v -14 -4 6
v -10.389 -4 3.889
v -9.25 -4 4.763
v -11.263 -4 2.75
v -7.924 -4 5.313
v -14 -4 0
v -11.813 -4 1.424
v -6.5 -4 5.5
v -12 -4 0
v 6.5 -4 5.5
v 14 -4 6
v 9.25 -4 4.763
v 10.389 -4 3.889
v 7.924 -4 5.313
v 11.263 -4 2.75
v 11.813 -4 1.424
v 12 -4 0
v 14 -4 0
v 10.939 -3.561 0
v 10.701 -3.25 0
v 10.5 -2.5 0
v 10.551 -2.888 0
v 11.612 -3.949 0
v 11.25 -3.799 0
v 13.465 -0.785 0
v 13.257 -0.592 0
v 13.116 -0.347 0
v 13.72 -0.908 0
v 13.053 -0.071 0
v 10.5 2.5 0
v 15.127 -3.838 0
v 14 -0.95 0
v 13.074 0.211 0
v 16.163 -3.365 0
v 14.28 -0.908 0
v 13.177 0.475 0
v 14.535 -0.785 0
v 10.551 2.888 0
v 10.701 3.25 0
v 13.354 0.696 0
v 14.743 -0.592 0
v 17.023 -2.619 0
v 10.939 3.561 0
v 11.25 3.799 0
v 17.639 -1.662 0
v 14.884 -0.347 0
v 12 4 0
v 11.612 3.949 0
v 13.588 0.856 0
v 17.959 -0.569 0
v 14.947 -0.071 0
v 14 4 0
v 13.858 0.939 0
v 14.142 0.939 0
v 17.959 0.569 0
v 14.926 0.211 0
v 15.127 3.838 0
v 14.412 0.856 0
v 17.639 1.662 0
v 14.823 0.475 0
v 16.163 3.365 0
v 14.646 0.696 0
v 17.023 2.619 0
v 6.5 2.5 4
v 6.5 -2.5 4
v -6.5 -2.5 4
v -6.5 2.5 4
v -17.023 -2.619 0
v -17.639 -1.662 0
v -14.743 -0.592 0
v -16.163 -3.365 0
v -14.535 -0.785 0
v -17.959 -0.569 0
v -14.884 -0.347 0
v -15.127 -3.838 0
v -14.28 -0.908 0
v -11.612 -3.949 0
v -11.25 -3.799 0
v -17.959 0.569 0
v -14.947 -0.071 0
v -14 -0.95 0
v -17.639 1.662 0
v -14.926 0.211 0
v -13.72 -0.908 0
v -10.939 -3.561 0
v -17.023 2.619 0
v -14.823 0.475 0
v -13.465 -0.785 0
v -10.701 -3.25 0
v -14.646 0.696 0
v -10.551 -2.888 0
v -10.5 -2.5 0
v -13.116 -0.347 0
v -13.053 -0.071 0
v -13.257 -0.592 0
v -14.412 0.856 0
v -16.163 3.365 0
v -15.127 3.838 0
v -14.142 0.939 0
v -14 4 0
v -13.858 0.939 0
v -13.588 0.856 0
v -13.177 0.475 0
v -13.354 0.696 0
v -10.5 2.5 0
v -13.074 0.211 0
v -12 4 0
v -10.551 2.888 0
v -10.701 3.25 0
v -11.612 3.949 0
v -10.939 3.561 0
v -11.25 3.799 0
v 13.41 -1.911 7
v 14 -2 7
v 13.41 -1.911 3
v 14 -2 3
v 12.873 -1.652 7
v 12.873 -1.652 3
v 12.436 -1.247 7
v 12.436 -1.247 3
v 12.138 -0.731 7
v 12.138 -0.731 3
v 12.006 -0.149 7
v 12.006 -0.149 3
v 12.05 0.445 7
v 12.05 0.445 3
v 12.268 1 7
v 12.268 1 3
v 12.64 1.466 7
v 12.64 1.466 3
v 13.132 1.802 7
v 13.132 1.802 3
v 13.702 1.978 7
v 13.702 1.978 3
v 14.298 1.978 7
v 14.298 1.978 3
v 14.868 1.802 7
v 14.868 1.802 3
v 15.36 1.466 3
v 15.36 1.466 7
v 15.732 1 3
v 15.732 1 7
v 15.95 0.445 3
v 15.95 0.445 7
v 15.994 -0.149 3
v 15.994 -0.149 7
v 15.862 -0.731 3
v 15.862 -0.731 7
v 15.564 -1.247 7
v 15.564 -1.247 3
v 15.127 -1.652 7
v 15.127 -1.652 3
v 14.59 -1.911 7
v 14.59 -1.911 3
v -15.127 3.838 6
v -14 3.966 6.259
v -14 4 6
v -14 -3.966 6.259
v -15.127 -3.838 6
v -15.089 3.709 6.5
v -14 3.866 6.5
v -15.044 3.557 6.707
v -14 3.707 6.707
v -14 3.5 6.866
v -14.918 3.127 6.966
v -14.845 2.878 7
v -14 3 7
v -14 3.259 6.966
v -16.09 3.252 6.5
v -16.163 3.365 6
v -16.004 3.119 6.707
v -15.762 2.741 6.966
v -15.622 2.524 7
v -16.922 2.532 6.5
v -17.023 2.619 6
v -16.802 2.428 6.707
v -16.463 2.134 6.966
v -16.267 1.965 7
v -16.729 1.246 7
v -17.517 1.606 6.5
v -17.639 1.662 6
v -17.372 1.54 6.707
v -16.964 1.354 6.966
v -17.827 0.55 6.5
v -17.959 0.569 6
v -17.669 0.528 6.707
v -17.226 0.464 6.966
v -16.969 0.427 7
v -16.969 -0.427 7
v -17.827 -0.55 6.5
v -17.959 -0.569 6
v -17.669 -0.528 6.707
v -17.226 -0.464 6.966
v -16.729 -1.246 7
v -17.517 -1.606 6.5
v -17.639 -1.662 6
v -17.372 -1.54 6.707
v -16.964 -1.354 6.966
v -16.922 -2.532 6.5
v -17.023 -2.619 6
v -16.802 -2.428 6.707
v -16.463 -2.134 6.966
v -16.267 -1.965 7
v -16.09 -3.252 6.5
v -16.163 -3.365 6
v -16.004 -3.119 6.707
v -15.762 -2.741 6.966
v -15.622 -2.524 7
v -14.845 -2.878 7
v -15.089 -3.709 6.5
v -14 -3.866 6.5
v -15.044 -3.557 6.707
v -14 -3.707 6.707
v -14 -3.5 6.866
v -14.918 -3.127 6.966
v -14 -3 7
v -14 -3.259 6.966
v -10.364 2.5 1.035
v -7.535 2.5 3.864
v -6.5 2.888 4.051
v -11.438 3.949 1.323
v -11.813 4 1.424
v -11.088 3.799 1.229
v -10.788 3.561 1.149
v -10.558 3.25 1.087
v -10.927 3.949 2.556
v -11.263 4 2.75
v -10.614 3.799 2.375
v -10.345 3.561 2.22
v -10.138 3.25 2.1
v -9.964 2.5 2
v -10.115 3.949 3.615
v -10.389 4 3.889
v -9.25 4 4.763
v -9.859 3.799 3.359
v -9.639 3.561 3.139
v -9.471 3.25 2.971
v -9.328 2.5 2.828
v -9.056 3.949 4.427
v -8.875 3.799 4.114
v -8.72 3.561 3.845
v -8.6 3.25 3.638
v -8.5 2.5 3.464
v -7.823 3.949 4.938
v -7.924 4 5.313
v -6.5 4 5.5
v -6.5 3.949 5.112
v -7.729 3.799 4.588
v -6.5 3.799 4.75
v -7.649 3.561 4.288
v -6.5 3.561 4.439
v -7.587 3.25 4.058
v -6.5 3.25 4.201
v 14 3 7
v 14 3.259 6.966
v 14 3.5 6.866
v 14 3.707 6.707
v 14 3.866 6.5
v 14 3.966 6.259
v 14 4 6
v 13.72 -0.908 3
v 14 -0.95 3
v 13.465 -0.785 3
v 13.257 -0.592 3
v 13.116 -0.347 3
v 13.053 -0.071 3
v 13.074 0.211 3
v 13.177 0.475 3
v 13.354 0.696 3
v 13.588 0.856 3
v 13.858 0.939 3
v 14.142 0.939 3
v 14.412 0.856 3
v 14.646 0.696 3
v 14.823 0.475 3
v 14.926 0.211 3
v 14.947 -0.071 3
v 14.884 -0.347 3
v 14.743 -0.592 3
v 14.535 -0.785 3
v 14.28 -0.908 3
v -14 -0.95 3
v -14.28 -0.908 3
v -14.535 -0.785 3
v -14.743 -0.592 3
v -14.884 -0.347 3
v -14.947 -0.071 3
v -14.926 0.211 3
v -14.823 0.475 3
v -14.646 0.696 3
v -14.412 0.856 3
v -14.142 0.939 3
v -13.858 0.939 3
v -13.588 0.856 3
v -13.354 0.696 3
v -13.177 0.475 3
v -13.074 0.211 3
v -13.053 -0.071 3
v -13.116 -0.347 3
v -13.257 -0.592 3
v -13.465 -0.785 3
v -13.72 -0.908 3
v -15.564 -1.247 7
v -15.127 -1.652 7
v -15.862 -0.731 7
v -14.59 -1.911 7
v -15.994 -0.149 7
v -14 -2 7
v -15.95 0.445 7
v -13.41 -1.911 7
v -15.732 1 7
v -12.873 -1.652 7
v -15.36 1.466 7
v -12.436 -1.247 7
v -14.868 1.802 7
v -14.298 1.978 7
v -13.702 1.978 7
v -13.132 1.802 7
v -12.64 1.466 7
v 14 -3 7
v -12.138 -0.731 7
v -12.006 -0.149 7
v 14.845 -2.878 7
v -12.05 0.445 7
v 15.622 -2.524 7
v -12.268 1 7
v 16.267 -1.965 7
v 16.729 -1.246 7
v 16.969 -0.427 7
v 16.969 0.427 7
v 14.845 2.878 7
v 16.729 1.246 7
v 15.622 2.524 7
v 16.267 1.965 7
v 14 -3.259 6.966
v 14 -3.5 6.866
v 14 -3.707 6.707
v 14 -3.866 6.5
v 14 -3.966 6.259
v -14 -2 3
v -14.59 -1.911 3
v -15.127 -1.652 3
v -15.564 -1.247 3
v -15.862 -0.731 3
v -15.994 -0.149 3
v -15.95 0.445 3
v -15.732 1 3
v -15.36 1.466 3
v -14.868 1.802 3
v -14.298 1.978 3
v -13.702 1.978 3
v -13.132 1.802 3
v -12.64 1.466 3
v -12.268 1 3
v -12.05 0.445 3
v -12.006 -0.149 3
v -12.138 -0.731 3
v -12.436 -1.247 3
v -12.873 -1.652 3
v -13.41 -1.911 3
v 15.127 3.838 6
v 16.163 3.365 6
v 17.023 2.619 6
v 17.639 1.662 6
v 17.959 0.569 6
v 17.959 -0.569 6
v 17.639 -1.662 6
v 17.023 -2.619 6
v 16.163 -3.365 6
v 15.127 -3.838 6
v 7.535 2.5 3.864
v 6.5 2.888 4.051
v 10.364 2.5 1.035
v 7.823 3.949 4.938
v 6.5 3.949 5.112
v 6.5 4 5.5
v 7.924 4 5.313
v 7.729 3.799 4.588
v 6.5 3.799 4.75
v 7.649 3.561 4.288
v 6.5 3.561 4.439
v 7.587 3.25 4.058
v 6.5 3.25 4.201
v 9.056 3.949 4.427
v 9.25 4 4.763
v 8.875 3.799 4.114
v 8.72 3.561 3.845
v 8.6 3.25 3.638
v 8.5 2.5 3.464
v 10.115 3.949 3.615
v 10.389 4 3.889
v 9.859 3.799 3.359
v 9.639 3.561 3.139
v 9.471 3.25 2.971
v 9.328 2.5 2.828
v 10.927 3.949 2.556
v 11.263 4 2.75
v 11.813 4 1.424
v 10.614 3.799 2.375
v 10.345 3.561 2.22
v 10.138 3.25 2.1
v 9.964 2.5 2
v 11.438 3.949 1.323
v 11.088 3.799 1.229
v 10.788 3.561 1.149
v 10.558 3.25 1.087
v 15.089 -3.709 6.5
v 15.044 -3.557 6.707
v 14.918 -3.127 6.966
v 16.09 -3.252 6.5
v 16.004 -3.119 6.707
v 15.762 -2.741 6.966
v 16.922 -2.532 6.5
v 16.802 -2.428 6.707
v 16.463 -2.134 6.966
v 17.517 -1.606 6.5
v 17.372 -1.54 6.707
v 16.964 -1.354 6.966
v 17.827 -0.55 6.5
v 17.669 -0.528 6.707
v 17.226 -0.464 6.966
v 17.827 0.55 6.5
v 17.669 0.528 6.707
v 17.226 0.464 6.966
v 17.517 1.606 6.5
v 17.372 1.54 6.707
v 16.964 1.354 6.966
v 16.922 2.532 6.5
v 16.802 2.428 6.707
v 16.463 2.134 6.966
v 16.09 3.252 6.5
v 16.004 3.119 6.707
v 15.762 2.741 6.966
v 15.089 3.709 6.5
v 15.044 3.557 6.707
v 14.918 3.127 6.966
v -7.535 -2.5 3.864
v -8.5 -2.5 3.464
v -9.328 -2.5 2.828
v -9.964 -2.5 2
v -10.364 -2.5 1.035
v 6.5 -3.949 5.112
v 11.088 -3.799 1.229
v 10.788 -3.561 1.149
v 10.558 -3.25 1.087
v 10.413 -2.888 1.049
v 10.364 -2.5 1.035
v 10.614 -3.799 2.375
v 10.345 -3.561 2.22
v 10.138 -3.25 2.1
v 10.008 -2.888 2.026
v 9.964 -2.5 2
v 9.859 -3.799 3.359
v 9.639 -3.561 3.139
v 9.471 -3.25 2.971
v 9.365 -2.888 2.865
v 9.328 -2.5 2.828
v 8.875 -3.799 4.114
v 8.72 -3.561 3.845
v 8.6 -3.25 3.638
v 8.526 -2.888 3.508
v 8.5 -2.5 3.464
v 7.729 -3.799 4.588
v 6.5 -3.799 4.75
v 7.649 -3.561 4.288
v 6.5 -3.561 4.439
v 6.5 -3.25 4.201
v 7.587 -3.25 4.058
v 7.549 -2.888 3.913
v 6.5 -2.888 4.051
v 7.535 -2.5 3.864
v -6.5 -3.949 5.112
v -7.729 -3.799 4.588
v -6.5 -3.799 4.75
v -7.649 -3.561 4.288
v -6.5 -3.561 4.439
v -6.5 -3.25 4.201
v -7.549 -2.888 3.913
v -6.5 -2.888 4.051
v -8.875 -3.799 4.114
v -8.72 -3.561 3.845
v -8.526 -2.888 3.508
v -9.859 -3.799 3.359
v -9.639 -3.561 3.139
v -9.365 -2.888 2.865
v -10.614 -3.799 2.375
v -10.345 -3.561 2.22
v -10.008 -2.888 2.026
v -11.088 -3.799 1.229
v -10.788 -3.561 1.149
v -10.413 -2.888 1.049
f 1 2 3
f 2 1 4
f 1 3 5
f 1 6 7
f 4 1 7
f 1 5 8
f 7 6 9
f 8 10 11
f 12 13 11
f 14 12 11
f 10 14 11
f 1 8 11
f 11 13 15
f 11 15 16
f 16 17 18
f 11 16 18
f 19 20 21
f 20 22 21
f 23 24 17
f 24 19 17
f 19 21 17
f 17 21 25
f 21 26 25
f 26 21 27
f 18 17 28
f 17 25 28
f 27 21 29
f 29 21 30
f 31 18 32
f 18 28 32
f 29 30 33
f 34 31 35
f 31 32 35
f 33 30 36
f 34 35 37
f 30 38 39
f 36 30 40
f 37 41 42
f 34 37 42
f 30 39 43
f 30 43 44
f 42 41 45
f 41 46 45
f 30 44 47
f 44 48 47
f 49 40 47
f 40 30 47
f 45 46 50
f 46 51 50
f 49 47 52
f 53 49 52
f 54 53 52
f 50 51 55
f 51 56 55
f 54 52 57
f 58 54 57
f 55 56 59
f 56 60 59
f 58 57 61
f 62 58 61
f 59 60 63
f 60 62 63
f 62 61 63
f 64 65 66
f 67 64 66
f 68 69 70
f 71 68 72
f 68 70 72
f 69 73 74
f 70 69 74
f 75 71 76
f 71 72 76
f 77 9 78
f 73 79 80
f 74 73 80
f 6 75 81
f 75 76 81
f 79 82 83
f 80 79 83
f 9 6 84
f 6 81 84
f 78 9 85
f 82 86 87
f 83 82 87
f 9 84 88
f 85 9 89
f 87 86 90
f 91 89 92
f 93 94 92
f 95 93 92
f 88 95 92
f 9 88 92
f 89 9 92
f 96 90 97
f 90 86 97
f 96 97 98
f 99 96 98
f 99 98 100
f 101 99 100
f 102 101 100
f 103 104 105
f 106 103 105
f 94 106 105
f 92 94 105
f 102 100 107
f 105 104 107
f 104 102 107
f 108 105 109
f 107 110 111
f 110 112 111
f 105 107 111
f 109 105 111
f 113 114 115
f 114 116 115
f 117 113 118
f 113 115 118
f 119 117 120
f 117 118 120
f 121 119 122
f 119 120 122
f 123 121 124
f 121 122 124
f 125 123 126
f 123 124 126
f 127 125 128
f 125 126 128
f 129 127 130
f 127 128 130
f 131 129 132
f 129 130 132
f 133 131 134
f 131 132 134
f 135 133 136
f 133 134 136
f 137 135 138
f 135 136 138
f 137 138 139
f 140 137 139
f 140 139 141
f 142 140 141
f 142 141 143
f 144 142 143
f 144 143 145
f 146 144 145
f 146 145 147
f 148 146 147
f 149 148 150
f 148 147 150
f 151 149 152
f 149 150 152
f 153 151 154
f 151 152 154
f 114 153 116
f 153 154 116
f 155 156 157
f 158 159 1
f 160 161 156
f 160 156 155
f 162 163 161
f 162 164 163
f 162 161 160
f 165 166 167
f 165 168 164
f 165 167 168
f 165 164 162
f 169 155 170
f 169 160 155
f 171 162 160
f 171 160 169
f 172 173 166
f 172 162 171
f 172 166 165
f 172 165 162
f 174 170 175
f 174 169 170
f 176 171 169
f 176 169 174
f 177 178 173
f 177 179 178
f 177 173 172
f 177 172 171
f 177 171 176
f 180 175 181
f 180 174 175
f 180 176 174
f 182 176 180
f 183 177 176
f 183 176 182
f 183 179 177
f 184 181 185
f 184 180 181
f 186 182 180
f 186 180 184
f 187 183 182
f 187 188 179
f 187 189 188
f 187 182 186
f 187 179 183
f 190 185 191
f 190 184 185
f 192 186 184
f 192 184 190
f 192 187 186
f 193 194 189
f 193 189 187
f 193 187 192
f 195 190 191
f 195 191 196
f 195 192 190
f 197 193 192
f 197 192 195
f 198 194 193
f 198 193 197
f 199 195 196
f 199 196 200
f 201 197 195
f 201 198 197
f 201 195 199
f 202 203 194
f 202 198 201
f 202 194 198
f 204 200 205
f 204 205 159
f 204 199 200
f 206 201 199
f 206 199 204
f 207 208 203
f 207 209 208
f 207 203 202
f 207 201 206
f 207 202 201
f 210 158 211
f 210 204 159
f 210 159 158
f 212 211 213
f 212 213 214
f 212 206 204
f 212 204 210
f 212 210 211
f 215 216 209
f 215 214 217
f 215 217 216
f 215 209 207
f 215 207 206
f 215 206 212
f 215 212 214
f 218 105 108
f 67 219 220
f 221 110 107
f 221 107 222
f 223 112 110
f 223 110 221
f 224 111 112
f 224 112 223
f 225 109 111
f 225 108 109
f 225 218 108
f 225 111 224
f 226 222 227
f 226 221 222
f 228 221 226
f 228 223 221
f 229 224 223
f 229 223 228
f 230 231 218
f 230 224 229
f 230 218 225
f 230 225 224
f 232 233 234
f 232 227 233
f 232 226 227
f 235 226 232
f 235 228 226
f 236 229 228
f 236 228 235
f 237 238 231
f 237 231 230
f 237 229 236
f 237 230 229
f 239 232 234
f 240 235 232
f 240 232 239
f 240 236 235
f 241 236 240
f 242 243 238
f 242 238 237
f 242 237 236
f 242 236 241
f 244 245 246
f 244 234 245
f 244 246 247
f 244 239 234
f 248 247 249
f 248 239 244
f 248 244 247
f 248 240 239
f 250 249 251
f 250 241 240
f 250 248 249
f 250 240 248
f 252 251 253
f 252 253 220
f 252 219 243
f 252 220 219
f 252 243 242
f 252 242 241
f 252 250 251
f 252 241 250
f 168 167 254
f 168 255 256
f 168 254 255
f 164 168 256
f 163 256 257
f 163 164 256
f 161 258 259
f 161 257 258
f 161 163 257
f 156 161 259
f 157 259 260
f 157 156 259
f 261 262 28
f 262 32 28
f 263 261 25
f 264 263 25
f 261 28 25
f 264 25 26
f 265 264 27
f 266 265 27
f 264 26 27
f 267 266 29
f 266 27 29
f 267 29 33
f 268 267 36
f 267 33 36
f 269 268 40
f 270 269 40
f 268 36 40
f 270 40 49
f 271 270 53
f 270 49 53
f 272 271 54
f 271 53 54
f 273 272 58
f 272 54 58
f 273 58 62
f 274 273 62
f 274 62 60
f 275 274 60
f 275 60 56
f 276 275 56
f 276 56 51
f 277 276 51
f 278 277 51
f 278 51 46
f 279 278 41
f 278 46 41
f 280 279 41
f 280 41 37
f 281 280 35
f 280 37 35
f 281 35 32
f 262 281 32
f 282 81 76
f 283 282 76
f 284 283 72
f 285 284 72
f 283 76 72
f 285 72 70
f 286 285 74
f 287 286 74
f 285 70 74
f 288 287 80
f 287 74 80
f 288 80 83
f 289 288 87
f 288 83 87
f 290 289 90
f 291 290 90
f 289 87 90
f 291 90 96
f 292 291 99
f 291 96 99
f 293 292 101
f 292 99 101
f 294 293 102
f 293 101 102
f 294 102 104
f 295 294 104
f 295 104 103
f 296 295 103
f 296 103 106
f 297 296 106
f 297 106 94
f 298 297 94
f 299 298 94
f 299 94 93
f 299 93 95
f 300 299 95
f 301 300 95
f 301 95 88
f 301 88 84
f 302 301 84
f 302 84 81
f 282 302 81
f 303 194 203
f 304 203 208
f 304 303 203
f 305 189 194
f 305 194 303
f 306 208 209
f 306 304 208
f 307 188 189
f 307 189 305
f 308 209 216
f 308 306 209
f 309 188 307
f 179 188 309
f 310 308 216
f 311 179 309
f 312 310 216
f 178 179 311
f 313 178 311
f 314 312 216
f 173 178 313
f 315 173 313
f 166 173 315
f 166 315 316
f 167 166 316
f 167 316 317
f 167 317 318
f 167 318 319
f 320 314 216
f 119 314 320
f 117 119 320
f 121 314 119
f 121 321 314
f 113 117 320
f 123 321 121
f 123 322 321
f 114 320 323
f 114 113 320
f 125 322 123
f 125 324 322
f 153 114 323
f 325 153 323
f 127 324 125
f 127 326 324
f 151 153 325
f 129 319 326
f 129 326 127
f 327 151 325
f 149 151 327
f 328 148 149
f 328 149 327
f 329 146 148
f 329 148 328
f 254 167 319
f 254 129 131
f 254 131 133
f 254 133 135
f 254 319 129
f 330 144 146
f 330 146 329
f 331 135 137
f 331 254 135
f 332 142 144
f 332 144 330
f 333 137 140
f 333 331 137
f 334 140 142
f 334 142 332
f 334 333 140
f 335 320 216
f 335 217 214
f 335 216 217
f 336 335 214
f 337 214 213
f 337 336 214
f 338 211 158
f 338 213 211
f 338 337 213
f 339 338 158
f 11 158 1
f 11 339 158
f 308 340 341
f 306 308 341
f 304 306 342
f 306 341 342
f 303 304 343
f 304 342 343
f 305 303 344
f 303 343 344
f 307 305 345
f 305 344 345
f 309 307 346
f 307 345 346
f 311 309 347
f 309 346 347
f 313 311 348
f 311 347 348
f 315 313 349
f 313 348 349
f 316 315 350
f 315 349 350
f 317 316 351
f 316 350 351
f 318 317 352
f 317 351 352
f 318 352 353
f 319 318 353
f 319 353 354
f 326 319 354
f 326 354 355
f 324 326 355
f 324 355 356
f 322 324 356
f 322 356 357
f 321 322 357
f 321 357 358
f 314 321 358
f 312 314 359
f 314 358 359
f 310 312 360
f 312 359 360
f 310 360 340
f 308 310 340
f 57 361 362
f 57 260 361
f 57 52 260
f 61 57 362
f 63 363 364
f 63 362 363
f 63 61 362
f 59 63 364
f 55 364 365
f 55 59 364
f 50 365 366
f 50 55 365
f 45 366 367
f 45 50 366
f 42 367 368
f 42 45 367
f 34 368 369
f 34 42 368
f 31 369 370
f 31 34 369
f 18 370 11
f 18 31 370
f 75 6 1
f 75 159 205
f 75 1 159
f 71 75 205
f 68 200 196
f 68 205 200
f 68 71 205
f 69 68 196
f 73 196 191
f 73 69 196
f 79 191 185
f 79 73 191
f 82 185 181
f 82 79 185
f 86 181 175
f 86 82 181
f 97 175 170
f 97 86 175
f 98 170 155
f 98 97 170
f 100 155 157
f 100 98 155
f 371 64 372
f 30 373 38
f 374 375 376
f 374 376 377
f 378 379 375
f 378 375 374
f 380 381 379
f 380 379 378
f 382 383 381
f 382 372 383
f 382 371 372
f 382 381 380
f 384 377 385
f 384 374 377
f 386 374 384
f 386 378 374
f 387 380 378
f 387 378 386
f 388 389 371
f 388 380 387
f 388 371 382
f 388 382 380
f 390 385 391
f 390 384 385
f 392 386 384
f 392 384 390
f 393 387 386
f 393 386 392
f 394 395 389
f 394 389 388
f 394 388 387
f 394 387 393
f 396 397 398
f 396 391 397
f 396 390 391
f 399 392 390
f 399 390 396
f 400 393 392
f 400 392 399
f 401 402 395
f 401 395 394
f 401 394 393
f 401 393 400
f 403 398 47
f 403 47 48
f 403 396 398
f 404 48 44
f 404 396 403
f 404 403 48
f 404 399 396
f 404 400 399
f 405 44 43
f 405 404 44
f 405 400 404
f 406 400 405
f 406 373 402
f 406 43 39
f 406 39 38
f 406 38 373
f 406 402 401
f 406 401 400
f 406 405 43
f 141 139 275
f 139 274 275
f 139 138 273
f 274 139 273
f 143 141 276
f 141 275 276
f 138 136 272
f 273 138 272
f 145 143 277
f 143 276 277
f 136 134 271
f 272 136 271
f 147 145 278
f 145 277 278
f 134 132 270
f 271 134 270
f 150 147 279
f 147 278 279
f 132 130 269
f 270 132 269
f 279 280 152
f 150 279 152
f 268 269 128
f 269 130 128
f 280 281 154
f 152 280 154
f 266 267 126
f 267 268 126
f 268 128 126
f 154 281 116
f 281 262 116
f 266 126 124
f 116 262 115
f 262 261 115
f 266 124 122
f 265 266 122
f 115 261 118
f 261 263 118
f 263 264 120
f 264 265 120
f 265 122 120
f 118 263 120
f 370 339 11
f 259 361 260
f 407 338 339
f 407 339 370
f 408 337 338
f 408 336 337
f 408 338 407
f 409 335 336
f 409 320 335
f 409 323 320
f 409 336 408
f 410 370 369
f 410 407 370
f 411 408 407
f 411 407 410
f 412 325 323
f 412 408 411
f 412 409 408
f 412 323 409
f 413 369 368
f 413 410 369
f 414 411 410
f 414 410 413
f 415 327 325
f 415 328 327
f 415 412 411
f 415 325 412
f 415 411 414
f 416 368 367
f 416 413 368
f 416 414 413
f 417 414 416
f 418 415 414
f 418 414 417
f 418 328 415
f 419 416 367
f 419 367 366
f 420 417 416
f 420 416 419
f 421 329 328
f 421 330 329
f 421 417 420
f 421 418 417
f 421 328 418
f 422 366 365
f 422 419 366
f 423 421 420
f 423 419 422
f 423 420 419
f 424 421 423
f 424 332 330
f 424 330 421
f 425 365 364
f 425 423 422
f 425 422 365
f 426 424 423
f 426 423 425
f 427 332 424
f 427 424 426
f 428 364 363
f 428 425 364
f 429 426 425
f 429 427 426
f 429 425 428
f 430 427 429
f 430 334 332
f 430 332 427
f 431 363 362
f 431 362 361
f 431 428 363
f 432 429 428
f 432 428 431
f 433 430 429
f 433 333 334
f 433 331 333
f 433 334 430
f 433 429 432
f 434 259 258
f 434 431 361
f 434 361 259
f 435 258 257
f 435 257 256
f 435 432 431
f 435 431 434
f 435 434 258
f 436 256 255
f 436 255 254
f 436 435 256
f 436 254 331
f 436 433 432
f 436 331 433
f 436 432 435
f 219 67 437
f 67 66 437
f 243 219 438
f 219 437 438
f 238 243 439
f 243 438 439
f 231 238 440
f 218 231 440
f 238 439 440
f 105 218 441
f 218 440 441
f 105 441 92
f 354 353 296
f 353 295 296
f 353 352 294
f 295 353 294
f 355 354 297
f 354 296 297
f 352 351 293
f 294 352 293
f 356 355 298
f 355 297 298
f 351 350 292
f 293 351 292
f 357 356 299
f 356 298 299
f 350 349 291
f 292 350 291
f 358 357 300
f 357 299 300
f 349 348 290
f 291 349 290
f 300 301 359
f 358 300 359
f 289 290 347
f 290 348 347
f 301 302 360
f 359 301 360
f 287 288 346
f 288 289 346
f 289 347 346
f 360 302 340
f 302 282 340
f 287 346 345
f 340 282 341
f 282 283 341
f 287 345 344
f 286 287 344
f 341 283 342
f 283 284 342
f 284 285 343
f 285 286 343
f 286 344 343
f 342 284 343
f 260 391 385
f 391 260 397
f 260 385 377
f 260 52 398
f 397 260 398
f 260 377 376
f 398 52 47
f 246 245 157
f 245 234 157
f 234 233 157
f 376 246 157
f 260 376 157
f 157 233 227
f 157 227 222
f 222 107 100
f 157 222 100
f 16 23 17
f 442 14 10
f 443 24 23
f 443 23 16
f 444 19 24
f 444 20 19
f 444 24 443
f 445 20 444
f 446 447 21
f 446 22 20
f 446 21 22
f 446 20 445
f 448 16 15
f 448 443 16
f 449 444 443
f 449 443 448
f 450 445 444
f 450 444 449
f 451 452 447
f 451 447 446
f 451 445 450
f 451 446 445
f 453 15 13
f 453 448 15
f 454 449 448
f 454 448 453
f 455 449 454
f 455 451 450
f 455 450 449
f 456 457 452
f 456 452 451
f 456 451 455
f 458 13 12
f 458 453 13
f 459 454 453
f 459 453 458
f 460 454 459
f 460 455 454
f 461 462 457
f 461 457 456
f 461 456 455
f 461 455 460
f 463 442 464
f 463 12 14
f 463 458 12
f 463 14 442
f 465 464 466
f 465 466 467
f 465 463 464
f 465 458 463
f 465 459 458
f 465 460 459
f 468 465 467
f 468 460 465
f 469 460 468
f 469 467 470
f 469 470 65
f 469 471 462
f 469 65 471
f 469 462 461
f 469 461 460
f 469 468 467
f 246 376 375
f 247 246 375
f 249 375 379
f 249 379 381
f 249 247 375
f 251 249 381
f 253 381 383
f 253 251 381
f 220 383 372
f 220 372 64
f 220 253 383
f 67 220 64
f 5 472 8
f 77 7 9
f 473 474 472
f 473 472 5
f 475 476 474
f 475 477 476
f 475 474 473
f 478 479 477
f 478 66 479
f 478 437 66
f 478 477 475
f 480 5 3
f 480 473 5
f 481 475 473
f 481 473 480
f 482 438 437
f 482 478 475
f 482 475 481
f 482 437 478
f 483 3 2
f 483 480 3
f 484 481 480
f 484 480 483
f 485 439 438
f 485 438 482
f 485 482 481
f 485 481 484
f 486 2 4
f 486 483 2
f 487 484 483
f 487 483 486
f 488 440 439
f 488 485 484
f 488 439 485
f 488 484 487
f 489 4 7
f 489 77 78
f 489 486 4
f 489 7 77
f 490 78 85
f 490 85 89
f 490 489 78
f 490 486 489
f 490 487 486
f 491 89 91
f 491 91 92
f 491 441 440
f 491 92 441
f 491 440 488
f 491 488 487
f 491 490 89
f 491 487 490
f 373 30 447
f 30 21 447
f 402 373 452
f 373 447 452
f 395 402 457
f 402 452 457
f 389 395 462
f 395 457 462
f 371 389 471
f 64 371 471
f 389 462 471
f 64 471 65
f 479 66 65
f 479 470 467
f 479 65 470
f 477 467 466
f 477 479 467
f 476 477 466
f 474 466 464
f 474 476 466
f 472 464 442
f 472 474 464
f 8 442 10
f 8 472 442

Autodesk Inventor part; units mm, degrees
ref_plane "YZ Plane" through (0, 0, 0) normal (1, 0, 0) x (0, 1, 0)
ref_plane "XZ Plane" through (0, 0, 0) normal (0, 1, 0) x (-1, 0, 0)
ref_plane "XY Plane" through (0, 0, 0) normal (0, 0, 1) x (1, 0, 0)
sketch "Sketch1" plane through (0, 0, 0) normal (0, 0, 1) x (1, 0, 0)
  line L0 (-14, 0) -> (14, 0) construction
  line L1 (-14, -4) -> (14, -4)
  line L2 (14, 4) -> (-14, 4)
  arc A0 (-14, 4) -> (-14, -4) centre (-14, 0) ccw
  arc A1 (14, -4) -> (14, 4) centre (14, 0) ccw
  point P0 (0, 0)
  dimension "d0" = 8
  dimension "d1" = 28
extrude "Extrusion1" add sketch "Sketch1" along normal blind 7
sketch "Sketch2" plane through (-14, -4, 0) normal (0, -1, 0) x (1, 0, 0)
  line L0 (7.5, 0) -> (20.5, 0) construction
  line L1 (7.5, -4) -> (20.5, -4)
  line L2 (20.5, 4) -> (7.5, 4)
  arc A0 (7.5, 4) -> (7.5, -4) centre (7.5, 0) ccw
  arc A1 (20.5, -4) -> (20.5, 4) centre (20.5, 0) ccw
  point P0 (14, 0)
  dimension "d4" = 4
  dimension "d5" = 13
extrude "Extrusion2" cut sketch "Sketch2" against normal through all
fillet "Fillet1" radius 1.5 6 edges at (0, -4, 4) (9.3284, -4, 2.8284) (-9.3284, -4, 2.8284) (0, 4, 4) (9.3284, 4, 2.8284) (-9.3284, 4, 2.8284)
fillet "Fillet2" radius 1 4 edges at (18, 0, 7) (0, 4, 7) (-18, 0, 7) (0, -4, 7)
sketch "Sketch3" plane through (0, 0, 7) normal (0, 0, 1) x (1, 0, 0)
  arc A0 (14, -4) -> (14, 4) centre (14, 0) ccw projected
  arc A1 (-14, 4) -> (-14, -4) centre (-14, 0) ccw projected
  point P0 (0, 0)
hole "Hole1" at (14, 0, 7) at (-14, 0, 7) direction (0, 0, -1) diameter 1.9 end through all counterbore diameter 4 counterbore depth 4
properties part number "cable clip"
